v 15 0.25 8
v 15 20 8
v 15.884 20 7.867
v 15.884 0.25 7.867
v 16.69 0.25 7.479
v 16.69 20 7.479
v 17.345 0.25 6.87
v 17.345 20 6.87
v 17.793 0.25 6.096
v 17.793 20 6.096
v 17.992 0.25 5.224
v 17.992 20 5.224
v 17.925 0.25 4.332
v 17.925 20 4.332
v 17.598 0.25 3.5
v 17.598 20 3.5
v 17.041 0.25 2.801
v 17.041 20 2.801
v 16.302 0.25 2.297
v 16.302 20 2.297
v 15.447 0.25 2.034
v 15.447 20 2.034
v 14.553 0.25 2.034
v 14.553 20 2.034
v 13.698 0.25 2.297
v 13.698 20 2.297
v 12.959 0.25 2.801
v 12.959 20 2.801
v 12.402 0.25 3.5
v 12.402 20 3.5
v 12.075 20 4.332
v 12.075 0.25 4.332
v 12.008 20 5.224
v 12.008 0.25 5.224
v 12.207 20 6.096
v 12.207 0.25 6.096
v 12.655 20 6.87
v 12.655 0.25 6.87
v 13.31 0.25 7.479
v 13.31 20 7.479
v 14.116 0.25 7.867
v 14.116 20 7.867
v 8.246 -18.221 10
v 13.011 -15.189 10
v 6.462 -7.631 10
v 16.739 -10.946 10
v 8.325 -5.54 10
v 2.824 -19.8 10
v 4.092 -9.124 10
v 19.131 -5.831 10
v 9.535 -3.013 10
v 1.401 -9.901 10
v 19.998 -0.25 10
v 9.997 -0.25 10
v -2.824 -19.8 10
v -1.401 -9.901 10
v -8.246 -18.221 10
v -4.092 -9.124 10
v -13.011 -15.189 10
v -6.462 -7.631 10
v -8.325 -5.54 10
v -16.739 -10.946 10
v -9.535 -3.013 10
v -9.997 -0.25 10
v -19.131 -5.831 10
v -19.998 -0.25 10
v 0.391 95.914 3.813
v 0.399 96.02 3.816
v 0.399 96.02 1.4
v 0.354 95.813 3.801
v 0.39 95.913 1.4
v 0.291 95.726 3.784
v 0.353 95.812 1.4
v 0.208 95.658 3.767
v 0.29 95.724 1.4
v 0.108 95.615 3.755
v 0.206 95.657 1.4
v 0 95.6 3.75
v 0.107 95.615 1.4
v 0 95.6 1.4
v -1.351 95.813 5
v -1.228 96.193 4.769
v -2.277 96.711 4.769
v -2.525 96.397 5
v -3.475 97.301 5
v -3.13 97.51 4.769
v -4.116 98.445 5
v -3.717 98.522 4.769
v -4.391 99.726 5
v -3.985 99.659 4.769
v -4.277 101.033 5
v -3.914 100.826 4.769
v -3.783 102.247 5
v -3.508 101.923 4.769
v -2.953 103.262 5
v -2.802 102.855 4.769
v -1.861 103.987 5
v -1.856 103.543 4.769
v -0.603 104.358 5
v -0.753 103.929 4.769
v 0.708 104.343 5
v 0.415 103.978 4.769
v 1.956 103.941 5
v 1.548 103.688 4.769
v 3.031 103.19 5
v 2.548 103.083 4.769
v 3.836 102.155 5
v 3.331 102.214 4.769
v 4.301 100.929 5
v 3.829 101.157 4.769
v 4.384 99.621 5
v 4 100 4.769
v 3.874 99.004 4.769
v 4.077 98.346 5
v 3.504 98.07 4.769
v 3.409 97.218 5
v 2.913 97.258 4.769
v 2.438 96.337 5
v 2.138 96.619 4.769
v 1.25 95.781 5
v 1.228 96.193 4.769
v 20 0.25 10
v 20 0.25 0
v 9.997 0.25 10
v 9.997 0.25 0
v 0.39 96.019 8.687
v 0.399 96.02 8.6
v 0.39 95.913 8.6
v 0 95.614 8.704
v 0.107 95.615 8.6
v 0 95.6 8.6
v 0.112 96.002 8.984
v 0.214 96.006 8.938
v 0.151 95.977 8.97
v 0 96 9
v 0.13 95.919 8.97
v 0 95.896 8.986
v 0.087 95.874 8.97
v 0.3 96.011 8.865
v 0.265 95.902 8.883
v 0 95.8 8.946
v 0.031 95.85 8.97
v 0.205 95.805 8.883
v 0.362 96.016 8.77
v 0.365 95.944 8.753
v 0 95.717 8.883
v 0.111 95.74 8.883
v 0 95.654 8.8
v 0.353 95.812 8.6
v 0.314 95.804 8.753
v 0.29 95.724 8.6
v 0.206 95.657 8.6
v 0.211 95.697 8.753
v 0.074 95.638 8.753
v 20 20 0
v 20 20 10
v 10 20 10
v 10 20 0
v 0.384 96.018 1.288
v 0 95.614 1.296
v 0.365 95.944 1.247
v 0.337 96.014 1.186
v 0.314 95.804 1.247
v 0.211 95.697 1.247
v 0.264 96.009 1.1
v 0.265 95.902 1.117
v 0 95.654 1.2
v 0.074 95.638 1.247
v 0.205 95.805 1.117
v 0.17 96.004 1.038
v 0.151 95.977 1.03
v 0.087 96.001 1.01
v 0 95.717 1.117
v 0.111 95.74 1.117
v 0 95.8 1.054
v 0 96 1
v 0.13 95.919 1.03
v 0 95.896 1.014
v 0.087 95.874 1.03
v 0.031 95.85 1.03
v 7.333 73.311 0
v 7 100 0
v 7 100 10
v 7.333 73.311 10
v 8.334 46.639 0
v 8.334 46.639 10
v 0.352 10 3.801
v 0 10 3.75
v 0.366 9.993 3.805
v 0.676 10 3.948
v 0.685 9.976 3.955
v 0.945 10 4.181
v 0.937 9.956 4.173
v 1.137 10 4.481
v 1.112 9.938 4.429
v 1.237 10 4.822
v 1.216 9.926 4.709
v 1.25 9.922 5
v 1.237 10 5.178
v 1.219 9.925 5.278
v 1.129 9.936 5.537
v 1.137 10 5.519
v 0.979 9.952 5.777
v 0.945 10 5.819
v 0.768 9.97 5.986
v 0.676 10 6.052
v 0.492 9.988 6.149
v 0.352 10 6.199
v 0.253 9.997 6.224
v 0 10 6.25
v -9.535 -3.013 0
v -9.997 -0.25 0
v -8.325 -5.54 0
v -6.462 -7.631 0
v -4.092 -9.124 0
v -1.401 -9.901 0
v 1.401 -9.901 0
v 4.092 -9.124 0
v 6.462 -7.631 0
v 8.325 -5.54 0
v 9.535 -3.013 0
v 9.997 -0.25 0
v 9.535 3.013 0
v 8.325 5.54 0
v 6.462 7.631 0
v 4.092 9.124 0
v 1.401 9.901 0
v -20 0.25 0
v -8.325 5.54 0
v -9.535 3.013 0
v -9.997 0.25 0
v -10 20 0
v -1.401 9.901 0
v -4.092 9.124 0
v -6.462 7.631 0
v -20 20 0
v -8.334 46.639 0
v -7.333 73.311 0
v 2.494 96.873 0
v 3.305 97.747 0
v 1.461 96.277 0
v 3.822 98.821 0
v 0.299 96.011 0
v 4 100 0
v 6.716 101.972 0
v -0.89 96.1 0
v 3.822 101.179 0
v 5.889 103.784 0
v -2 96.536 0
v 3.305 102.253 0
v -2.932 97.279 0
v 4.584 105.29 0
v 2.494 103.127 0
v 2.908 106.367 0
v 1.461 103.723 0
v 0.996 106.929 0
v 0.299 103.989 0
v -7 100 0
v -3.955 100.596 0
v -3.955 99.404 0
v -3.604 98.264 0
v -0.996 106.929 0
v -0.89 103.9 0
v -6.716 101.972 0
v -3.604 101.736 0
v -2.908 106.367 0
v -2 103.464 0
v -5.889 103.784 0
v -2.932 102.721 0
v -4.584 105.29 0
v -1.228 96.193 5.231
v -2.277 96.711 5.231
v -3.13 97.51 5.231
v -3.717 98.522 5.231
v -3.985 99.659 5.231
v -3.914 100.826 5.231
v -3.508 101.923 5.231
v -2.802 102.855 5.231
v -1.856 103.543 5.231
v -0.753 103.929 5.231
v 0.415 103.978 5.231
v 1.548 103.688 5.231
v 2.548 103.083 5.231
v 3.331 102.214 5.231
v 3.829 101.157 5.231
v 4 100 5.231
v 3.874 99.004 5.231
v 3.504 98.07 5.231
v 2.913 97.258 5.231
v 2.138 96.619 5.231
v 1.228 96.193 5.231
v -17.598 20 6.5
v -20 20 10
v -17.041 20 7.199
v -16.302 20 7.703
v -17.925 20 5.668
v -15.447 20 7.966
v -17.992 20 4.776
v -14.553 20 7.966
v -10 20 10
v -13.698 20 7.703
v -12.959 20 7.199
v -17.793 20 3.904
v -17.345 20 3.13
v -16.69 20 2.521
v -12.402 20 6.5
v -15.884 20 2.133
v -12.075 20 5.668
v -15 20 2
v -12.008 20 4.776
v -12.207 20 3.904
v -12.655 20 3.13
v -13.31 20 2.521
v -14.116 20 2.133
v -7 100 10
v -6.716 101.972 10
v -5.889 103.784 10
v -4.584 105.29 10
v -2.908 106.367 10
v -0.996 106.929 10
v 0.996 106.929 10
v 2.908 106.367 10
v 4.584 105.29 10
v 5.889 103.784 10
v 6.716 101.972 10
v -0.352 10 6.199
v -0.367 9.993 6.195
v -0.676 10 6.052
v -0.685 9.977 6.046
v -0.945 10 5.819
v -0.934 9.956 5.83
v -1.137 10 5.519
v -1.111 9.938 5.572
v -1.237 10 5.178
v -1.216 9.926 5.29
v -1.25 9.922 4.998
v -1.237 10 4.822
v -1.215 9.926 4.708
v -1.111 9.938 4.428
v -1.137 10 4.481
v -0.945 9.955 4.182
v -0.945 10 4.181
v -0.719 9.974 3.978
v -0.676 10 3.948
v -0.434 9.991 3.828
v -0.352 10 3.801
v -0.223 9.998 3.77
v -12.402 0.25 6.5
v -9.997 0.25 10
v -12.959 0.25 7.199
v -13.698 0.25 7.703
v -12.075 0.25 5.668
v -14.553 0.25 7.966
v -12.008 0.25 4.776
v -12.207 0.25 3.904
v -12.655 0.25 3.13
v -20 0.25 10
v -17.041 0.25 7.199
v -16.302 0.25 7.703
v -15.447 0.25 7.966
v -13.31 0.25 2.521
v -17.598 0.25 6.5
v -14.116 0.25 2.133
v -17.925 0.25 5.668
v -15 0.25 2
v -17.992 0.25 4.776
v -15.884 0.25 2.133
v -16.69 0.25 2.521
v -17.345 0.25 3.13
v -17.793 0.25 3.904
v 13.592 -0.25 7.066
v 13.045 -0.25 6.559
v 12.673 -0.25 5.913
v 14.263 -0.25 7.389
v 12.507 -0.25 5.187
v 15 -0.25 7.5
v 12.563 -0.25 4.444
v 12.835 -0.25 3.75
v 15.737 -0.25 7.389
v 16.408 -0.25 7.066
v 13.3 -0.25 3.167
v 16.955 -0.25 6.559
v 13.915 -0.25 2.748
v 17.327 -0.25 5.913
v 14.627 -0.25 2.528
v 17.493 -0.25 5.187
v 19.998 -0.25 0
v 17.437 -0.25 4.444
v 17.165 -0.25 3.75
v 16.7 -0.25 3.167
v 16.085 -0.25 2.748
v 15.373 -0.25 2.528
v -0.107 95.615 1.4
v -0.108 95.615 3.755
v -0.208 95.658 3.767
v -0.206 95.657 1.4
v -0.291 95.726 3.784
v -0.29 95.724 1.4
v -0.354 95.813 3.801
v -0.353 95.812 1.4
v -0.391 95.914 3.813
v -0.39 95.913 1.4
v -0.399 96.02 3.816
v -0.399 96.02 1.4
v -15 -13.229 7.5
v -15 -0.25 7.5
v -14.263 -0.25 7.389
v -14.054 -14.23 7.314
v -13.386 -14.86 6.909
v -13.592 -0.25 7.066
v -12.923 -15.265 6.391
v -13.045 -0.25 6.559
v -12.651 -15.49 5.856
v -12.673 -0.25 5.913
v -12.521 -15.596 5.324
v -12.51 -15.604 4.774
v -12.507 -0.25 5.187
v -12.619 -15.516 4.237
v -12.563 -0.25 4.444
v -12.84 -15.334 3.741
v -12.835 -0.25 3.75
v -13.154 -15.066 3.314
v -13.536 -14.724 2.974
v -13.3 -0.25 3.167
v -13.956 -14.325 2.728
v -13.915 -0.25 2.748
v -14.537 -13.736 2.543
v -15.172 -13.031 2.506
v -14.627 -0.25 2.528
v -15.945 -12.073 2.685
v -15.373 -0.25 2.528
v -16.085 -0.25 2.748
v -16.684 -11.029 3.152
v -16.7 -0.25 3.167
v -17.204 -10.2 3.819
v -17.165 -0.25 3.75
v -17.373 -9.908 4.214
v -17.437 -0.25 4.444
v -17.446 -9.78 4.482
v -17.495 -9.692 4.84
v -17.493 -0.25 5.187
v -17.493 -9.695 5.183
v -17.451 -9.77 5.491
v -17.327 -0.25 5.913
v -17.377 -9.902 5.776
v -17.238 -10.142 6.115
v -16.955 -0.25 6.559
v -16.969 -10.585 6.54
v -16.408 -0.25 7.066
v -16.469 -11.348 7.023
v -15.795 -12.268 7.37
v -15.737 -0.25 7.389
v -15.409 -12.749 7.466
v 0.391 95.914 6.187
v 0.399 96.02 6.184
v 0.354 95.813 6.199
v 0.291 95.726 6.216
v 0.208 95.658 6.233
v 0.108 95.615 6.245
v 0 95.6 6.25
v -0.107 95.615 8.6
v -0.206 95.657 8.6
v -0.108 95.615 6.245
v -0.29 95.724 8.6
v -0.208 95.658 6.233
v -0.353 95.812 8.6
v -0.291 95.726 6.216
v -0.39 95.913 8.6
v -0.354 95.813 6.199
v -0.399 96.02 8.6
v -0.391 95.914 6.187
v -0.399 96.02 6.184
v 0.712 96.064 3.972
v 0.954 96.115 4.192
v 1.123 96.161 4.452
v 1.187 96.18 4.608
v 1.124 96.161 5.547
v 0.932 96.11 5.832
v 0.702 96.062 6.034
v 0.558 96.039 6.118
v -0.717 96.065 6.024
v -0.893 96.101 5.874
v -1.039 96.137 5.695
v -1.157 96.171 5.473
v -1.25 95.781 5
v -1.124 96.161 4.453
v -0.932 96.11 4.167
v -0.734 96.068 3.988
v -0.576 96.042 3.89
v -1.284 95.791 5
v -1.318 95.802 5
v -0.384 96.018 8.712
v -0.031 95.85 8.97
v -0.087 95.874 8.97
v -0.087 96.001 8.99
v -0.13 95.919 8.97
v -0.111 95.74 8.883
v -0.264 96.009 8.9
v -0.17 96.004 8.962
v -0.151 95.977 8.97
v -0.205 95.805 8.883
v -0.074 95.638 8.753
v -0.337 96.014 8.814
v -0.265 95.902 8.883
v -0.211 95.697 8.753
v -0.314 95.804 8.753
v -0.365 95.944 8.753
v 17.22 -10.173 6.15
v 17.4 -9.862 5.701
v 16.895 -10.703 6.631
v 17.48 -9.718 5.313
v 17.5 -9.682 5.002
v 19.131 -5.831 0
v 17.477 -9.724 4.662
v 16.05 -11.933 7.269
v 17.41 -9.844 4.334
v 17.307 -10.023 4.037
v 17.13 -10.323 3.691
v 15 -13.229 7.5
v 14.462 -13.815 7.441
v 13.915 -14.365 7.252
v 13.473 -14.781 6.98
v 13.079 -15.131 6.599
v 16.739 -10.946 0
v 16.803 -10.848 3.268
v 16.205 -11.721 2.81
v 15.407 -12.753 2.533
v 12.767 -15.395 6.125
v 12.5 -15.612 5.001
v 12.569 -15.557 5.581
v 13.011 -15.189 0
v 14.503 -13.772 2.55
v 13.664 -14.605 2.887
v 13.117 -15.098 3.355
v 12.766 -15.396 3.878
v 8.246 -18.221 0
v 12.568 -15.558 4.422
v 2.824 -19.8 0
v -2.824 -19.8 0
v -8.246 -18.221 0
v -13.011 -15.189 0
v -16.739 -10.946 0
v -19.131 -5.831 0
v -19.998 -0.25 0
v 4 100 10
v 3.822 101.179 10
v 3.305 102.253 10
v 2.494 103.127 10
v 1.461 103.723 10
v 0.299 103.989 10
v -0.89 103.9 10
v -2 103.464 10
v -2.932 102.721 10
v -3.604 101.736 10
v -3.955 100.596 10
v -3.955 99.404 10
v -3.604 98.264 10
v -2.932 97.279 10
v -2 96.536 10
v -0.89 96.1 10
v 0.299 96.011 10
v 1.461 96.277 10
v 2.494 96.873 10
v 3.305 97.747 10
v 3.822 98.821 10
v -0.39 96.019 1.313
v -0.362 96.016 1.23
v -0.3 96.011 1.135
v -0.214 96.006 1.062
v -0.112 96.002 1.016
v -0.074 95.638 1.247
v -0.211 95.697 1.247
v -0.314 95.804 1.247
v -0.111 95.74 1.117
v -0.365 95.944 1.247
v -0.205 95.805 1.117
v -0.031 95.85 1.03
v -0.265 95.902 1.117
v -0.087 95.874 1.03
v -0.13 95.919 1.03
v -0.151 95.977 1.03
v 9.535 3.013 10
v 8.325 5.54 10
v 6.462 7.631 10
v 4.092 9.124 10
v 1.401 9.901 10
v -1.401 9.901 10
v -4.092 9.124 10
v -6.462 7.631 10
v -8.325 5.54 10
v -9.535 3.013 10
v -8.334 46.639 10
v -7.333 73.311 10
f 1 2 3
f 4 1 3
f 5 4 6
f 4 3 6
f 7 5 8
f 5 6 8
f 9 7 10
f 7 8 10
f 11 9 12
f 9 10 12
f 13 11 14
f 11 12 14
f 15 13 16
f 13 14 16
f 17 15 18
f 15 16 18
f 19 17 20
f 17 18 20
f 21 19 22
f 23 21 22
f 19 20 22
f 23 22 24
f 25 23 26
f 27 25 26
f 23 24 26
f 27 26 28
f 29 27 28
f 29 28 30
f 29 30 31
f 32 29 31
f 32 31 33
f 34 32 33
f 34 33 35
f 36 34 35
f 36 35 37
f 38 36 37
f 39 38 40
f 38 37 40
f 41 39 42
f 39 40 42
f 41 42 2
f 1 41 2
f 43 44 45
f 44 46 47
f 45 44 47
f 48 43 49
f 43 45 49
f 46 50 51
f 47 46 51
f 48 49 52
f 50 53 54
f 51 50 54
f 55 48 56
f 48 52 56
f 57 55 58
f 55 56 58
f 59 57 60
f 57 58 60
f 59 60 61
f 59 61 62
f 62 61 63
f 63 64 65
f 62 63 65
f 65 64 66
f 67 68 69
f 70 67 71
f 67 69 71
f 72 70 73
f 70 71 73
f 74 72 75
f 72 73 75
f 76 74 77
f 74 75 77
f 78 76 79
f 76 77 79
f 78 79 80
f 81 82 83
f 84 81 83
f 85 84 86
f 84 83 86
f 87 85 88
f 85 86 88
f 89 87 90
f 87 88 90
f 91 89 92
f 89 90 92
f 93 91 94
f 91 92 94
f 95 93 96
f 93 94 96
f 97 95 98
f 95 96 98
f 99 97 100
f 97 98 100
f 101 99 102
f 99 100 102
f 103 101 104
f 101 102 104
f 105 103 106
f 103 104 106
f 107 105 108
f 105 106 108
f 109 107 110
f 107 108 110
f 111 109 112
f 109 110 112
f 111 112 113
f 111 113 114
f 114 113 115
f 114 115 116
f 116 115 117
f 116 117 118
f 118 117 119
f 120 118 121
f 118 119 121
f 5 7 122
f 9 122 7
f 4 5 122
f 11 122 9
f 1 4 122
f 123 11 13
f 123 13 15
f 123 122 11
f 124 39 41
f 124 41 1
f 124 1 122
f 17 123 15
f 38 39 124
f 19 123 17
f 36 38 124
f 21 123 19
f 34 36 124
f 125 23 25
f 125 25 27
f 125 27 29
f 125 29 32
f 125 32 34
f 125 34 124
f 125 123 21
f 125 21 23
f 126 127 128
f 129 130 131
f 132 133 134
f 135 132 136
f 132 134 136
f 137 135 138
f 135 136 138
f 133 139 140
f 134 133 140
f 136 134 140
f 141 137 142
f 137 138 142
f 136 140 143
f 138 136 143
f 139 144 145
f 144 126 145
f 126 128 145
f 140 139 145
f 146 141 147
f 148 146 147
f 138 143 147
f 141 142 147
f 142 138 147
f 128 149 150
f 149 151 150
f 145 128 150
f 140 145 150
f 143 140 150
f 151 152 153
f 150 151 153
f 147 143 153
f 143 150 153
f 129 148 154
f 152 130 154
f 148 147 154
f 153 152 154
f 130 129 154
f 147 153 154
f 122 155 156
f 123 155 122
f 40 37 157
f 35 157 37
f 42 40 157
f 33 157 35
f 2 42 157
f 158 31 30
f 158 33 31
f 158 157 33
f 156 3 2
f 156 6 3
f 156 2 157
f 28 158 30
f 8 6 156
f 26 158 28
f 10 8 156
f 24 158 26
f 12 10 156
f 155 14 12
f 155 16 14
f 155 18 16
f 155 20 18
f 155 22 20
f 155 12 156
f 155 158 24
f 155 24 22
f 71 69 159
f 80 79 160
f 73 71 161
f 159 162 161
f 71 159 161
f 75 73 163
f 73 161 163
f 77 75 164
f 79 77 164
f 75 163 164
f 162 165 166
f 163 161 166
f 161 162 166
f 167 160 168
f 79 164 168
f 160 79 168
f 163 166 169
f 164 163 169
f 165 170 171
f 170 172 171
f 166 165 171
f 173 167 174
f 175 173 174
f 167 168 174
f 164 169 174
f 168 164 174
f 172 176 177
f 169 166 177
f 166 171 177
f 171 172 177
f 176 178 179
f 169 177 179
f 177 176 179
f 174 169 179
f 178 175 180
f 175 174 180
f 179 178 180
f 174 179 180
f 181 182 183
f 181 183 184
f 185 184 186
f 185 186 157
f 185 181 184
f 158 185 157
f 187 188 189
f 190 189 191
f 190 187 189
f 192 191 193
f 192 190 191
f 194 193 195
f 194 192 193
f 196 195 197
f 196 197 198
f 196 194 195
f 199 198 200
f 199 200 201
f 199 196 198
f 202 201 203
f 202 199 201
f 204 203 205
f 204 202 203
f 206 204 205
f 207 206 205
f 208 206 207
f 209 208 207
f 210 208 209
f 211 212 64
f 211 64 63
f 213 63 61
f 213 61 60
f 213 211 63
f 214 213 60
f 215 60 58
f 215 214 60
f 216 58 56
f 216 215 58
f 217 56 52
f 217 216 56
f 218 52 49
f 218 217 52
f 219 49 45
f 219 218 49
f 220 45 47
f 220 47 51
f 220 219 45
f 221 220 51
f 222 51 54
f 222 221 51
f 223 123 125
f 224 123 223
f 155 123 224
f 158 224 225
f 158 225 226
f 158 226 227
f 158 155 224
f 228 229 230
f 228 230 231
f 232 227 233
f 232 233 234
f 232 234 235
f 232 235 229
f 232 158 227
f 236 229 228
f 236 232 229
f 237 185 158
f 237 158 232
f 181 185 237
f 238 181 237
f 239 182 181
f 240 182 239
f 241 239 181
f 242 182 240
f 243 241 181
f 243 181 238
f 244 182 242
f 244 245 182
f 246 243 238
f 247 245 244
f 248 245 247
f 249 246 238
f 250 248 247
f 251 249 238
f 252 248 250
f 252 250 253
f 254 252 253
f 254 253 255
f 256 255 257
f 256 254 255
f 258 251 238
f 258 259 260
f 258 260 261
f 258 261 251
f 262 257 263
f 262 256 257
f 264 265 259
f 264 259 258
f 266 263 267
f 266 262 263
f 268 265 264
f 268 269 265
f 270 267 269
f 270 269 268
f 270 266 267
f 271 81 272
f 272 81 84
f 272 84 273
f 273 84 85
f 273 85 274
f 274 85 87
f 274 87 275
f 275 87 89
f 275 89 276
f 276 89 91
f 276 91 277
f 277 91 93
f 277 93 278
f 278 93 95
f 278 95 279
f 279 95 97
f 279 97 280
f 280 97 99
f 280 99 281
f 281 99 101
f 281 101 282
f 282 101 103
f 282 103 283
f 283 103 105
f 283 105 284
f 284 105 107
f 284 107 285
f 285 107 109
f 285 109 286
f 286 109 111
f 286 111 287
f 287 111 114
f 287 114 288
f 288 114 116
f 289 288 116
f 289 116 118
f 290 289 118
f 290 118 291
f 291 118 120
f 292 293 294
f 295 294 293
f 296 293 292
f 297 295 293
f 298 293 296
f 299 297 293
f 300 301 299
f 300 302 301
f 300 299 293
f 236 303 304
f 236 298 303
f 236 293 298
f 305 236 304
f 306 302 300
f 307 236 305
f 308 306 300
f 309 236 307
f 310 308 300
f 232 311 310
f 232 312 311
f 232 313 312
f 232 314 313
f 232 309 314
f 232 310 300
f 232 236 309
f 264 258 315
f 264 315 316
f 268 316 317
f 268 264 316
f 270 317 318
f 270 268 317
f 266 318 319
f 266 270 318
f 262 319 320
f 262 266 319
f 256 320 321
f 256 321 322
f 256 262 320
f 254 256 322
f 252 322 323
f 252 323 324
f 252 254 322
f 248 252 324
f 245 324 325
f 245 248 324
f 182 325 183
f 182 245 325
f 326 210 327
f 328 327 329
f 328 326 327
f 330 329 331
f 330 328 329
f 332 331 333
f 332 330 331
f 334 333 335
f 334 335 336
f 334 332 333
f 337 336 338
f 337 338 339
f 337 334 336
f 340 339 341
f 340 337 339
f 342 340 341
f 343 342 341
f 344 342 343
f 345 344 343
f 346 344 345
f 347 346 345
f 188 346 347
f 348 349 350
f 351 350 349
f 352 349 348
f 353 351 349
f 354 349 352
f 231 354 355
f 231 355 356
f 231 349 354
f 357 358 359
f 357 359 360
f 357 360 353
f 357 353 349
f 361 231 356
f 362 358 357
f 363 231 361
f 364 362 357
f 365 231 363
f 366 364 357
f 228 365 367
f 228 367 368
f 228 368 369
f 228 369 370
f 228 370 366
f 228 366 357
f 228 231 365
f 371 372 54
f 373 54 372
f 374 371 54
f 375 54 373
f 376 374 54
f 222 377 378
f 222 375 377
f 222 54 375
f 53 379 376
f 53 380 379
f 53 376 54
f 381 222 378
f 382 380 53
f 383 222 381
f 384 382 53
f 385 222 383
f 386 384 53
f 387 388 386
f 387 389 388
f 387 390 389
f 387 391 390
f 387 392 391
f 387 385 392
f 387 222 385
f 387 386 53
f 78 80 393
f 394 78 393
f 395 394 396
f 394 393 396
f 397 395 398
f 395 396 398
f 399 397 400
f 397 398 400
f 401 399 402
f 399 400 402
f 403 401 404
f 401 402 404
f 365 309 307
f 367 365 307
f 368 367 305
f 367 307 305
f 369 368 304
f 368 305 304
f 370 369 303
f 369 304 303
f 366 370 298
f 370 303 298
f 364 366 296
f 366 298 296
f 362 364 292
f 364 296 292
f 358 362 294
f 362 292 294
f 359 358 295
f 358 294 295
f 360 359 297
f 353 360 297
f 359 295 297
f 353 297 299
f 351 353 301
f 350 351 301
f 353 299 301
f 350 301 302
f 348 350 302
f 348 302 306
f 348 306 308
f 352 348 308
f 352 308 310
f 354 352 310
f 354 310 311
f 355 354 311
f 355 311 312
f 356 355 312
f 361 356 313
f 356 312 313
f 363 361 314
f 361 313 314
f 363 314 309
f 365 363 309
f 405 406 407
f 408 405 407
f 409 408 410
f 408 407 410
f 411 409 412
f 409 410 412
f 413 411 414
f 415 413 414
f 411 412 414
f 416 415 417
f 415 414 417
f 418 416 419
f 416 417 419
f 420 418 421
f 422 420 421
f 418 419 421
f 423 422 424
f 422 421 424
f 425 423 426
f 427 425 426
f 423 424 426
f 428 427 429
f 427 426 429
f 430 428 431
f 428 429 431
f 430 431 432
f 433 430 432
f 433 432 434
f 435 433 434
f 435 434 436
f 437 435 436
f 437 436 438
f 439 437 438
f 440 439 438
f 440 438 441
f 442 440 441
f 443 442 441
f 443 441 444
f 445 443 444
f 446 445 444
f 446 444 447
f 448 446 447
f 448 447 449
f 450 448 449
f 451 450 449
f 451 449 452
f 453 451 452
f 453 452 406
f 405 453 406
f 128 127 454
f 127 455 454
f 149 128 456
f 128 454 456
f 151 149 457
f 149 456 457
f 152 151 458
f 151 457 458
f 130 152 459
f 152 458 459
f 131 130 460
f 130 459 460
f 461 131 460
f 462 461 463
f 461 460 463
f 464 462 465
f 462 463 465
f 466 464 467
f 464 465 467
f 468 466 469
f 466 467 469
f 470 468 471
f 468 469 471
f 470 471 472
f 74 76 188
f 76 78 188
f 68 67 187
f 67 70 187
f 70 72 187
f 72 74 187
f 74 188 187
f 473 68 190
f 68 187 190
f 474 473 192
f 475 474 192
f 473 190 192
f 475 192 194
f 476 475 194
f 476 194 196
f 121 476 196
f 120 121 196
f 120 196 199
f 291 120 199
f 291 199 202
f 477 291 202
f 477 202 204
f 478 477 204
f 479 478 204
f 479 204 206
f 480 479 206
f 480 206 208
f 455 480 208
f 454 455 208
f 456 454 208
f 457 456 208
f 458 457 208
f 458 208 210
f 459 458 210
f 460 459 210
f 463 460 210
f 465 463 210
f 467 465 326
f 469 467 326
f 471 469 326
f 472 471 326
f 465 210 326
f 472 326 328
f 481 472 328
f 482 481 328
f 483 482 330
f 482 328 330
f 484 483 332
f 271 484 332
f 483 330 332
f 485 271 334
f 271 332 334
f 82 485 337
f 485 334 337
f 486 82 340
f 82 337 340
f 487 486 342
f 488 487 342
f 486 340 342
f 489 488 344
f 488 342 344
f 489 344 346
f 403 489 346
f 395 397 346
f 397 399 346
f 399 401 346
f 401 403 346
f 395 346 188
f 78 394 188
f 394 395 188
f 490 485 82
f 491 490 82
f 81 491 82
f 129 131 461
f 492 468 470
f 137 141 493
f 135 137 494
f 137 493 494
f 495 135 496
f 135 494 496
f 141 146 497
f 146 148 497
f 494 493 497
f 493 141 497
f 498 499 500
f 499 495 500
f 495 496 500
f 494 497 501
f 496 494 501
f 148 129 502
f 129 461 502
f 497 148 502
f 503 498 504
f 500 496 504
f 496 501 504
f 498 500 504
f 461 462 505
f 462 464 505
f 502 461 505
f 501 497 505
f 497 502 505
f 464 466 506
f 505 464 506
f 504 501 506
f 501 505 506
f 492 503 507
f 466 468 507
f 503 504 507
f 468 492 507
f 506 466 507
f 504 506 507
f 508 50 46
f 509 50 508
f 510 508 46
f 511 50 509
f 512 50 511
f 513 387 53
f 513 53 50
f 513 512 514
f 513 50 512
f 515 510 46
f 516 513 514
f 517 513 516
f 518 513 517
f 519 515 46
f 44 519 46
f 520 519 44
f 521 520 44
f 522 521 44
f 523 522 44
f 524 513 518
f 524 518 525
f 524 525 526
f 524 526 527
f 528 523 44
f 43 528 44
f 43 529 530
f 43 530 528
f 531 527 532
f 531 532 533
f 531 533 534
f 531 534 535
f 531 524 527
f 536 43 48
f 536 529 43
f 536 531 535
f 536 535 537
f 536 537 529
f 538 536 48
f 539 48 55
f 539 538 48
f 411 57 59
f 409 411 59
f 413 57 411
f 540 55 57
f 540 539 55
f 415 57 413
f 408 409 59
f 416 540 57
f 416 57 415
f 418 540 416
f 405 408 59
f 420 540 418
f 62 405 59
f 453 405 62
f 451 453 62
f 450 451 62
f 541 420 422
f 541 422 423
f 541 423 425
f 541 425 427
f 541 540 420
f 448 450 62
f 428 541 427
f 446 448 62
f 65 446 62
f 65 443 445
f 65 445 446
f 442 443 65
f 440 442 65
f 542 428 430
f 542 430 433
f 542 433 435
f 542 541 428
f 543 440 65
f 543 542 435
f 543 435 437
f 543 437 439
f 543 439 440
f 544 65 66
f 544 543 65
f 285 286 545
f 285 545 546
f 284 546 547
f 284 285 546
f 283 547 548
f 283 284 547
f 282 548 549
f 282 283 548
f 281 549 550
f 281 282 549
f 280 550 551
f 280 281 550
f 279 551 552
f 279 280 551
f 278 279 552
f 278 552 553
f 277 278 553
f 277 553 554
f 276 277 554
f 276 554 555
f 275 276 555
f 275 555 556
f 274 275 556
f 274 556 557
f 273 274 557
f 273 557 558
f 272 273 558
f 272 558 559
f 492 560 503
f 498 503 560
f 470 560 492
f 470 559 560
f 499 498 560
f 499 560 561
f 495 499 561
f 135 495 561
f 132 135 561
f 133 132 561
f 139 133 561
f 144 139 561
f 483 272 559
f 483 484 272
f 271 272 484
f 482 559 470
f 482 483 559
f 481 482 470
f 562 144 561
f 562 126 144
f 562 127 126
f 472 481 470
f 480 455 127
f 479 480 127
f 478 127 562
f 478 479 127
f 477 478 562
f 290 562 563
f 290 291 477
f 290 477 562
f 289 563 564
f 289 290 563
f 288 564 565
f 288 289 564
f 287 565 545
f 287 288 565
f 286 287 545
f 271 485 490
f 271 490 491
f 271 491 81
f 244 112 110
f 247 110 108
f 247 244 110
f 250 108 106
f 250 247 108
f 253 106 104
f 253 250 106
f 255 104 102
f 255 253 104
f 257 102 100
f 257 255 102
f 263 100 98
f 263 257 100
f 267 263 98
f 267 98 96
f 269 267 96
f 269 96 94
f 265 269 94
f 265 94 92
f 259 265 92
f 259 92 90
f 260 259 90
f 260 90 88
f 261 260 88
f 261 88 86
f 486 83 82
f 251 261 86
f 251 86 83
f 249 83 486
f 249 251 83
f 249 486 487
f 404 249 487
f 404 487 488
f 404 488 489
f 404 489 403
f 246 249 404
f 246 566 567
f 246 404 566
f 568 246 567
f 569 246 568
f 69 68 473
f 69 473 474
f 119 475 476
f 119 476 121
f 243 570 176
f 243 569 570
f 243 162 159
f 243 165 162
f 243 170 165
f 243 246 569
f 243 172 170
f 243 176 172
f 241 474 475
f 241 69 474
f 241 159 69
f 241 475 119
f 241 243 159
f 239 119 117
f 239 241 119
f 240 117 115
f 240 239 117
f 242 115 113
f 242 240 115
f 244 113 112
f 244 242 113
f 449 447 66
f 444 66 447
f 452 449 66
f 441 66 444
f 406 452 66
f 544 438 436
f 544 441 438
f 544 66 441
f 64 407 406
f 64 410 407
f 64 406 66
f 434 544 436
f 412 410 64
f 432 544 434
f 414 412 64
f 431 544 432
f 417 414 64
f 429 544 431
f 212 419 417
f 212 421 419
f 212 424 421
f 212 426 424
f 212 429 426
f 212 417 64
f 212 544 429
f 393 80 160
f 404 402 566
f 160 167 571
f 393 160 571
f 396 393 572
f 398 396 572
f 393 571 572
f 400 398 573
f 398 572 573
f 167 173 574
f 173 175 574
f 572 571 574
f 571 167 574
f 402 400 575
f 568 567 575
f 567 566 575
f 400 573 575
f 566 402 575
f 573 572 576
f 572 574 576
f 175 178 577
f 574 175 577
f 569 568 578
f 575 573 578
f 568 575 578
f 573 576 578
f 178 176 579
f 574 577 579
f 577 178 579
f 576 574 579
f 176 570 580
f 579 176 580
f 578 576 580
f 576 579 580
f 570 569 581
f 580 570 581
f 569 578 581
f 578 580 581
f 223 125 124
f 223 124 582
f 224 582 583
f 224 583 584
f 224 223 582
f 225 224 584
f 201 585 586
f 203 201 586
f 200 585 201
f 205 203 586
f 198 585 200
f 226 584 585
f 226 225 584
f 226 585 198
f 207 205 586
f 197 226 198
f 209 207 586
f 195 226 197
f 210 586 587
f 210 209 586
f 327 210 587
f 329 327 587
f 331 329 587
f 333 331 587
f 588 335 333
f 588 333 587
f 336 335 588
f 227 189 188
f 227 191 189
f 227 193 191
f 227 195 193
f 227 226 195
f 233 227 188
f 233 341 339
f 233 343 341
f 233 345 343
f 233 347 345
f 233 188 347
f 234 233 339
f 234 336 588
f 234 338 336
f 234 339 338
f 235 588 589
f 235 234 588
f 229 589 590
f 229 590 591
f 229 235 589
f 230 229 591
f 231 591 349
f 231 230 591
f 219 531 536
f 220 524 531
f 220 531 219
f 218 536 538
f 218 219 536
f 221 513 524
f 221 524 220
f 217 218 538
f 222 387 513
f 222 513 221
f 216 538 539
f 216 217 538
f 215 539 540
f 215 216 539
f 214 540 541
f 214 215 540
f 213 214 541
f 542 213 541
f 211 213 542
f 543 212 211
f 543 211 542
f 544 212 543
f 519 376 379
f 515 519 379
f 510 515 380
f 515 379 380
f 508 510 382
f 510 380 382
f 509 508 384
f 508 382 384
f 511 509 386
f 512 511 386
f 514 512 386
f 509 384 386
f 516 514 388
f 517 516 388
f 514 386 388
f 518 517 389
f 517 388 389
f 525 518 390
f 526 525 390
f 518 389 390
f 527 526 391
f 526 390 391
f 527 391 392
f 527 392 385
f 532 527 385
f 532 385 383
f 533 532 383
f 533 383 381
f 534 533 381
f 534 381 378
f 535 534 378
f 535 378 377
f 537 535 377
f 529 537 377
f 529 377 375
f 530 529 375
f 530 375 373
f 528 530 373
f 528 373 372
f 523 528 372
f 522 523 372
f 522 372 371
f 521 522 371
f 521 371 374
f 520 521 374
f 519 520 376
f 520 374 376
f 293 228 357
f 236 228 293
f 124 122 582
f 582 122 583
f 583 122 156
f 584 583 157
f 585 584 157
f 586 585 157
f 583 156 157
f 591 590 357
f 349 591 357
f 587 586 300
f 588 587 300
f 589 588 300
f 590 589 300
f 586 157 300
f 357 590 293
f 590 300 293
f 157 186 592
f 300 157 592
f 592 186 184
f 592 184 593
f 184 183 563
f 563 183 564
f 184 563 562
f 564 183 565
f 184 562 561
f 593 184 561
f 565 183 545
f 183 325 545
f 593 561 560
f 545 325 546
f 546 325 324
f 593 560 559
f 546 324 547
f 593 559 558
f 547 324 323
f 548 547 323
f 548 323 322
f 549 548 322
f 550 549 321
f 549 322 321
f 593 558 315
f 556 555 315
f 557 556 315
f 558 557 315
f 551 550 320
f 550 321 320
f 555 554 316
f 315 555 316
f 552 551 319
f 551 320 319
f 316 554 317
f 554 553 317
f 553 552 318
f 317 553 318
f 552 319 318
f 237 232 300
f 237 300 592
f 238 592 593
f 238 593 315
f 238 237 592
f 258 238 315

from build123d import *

# Parameters (mm, degrees)
SKETCH1_R                           = 4
BOSS_EXTRUDE1_DEPTH                 = 10
BOSS_EXTRUDE1_2_DEPTH               = 10
SKETCH2_R                           = 3
SKETCH2_R_2                         = 2.5
CUT_EXTRUDE1_DEPTH                  = 19.75
SKETCH2_2_R                         = 2.5
CUT_EXTRUDE2_DEPTH                  = 90.827612681
CUT_EXTRUDE3_REACH                  = 101.544
CUT_EXTRUDE3_END_RADIUS             = 4
SKETCH3_R                           = 1.25
CUT_EXTRUDE3_DIRECTION_2_REACH      = 101.544
CUT_EXTRUDE3_DIRECTION_2_END_RADIUS = 10


with BuildPart() as part:
    # Sketch1 → Boss-Extrude1 (new body)
    with BuildSketch(Plane.XY):
        with BuildLine():
            Line((-20, 0.25), (-20, 20))
            Line((-20, 20), (-10, 20))
            ThreePointArc((-10, 20), (-7.750263487, 59.971884881), (-7, 100))
            ThreePointArc((-7, 100), (0, 107), (7, 100))
            ThreePointArc((7, 100), (7.750263487, 59.971884881), (10, 20))
            Line((10, 20), (20, 20))
            Line((20, 20), (20, 0.25))
            Line((20, 0.25), (9.996874512, 0.25))
            ThreePointArc((9.996874512, 0.25), (0, 10), (-9.996874512, 0.25))
            Line((-9.996874512, 0.25), (-20, 0.25))
        make_face()
        with Locations((0, 100)):
            Circle(SKETCH1_R, mode=Mode.SUBTRACT)
    extrude(amount=BOSS_EXTRUDE1_DEPTH)

    # Sketch2 → Cut-Extrude1 (cut)
    # profile 1 of 2: a face of its own
    with BuildSketch(Plane(origin=(0, 20, 0), x_dir=(1, 0, 0), z_dir=(0, 1, 0))):
        with Locations(Location((15, -5, 0), (0, 0, 270))):
            Circle(SKETCH2_R)
        with Locations(Location((15, -5, 0), (0, 0, 270))):
            Circle(SKETCH2_R_2, mode=Mode.SUBTRACT)
    # profile 2 of 2: a face of its own
    with BuildSketch(Plane(origin=(0, 20, 0), x_dir=(1, 0, 0), z_dir=(0, 1, 0))):
        with Locations(Location((-15, -5, 0), (0, 0, 90))):
            Circle(SKETCH2_R)
        with Locations(Location((-15, -5, 0), (0, 0, 90))):
            Circle(SKETCH2_R_2, mode=Mode.SUBTRACT)
    extrude(amount=-CUT_EXTRUDE1_DEPTH, mode=Mode.SUBTRACT)


with BuildPart() as body_2:
    # Sketch1 → Boss-Extrude1 2 (new body)
    with BuildSketch(Plane.XY):
        with BuildLine():
            Line((-19.998437439, -0.25), (-9.996874512, -0.25))
            ThreePointArc((-9.996874512, -0.25), (0, -10), (9.996874512, -0.25))
            Line((9.996874512, -0.25), (19.998437439, -0.25))
            ThreePointArc((19.998437439, -0.25), (0, -20), (-19.998437439, -0.25))
        make_face()
    extrude(amount=BOSS_EXTRUDE1_2_DEPTH)


with BuildPart() as cut_extrude1_piece_1:
    # of the separate pieces the step leaves, piece 1, a body of its own (cut_extrude1_pieces)
    add(part.part.solids().sort_by_distance((-9.996874512, 0.25, 0))[0])

    # Cut-Extrude3: up to this cylinder (the profile starts outside it)
    cut_extrude3_end = Plane(origin=(0, 100, 5), z_dir=(0, 0, -1)) * Cylinder(CUT_EXTRUDE3_END_RADIUS, 212.088, mode=Mode.PRIVATE)
    # Sketch3 → Cut-Extrude3 (cut, up to the surface)
    with BuildSketch(Plane(origin=(0, 10, 0), x_dir=(-1, 0, 0), z_dir=(0, -1, 0)), mode=Mode.PRIVATE) as cut_extrude3_sk1:
        with Locations(Location((0, -5, 0), (0, 0, 90))):
            Circle(SKETCH3_R)
    cut_extrude3_tool1 = extrude(cut_extrude3_sk1.sketch, amount=-CUT_EXTRUDE3_REACH, mode=Mode.PRIVATE) - cut_extrude3_end
    add(cut_extrude3_tool1.solids().sort_by_distance((0, 10, 5))[0], mode=Mode.SUBTRACT)

    # Cut-Extrude3 direction 2: up to this cylinder (the profile starts outside it)
    cut_extrude3_direction_2_end = Plane(origin=(0, 0, 5), z_dir=(0, 0, -1)) * Cylinder(CUT_EXTRUDE3_DIRECTION_2_END_RADIUS, 224.088, mode=Mode.PRIVATE)
    # Sketch3 → Cut-Extrude3 direction 2 (cut, up to the surface)
    with BuildSketch(Plane(origin=(0, 10, 0), x_dir=(-1, 0, 0), z_dir=(0, -1, 0)), mode=Mode.PRIVATE) as cut_extrude3_direction_2_sk1:
        with Locations(Location((0, -5, 0), (0, 0, 90))):
            Circle(SKETCH3_R)
    cut_extrude3_direction_2_tool1 = extrude(cut_extrude3_direction_2_sk1.sketch, amount=CUT_EXTRUDE3_DIRECTION_2_REACH, mode=Mode.PRIVATE) - cut_extrude3_direction_2_end
    add(cut_extrude3_direction_2_tool1.solids().sort_by_distance((0, 10, 5))[0], mode=Mode.SUBTRACT)
    add(cut_extrude3_direction_2_tool1.solids().sort_by_distance((0, 10, 5))[1], mode=Mode.SUBTRACT)

    # Sketch5 → Cut-Revolve1 (revolve, cut)
    with BuildSketch(Plane(origin=(0, 0, 0), x_dir=(0, 0, -1), z_dir=(1, 0, 0))):
        with BuildLine():
            Line((-5, 95.6), (-5.230940108, 96))
            Line((-5.230940108, 96), (-9, 96))
            ThreePointArc((-9, 96), (-8.882842712, 95.717157288), (-8.6, 95.6))
            Line((-8.6, 95.6), (-5, 95.6))
        make_face()
        with BuildLine():
            ThreePointArc((-1.4, 95.6), (-1.117157288, 95.717157288), (-1, 96))
            Line((-1, 96), (-4.769059892, 96))
            Line((-4.769059892, 96), (-5, 95.6))
            Line((-5, 95.6), (-1.4, 95.6))
        make_face()
    revolve(axis=Axis((0, 96, 10), (0, 0, -1)), mode=Mode.SUBTRACT)

    # Sketch5<5> → Cut-Revolve2 (revolve, cut)
    with BuildSketch(Plane(origin=(0, 0, 0), x_dir=(0, 0, -1), z_dir=(1, 0, 0)), mode=Mode.PRIVATE) as cut_revolve2_sk:
        Polygon((-5, 95.6), (-4.769059892, 96), (-5.230940108, 96), align=None)
    revolve(cut_revolve2_sk.sketch.rotate(Axis((0, 100, 10), (0, 0, -1)), 17.88577553), axis=Axis((0, 100, 10), (0, 0, -1)), mode=Mode.SUBTRACT)


with BuildPart() as cut_extrude1_piece_2:
    # of the separate pieces the step leaves, piece 2, a body of its own (cut_extrude1_pieces)
    add(part.part.solids().sort_by_distance((-15, 0.25, 2.5))[0])


with BuildPart() as cut_extrude1_piece_3:
    # of the separate pieces the step leaves, piece 3, a body of its own (cut_extrude1_pieces)
    add(part.part.solids().sort_by_distance((15, 0.25, 7.5))[0])


with BuildPart() as cut_extrude2_tool:
    # Sketch2<2> → Cut-Extrude2 (new, through all)
    with BuildSketch(Plane(origin=(0, 20, 0), x_dir=(1, 0, 0), z_dir=(0, 1, 0))):
        with Locations(Location((-15, -5, 0), (0, 0, 270))):
            Circle(SKETCH2_2_R)
        with Locations(Location((15, -5, 0), (0, 0, 270))):
            Circle(SKETCH2_2_R)
    extrude(amount=-CUT_EXTRUDE2_DEPTH)


with BuildPart() as body_2_1:
    add(body_2.part)

    # Cut-Extrude2: cut by cut_extrude2_tool
    add(cut_extrude2_tool.part, mode=Mode.SUBTRACT)


with BuildPart() as cut_extrude1_piece_2_1:
    add(cut_extrude1_piece_2.part)

    # Cut-Extrude2: cut by cut_extrude2_tool
    add(cut_extrude2_tool.part, mode=Mode.SUBTRACT)


with BuildPart() as cut_extrude1_piece_3_1:
    add(cut_extrude1_piece_3.part)

    # Cut-Extrude2: cut by cut_extrude2_tool
    add(cut_extrude2_tool.part, mode=Mode.SUBTRACT)


solid = Compound([cut_extrude1_piece_1.part, body_2_1.part])
